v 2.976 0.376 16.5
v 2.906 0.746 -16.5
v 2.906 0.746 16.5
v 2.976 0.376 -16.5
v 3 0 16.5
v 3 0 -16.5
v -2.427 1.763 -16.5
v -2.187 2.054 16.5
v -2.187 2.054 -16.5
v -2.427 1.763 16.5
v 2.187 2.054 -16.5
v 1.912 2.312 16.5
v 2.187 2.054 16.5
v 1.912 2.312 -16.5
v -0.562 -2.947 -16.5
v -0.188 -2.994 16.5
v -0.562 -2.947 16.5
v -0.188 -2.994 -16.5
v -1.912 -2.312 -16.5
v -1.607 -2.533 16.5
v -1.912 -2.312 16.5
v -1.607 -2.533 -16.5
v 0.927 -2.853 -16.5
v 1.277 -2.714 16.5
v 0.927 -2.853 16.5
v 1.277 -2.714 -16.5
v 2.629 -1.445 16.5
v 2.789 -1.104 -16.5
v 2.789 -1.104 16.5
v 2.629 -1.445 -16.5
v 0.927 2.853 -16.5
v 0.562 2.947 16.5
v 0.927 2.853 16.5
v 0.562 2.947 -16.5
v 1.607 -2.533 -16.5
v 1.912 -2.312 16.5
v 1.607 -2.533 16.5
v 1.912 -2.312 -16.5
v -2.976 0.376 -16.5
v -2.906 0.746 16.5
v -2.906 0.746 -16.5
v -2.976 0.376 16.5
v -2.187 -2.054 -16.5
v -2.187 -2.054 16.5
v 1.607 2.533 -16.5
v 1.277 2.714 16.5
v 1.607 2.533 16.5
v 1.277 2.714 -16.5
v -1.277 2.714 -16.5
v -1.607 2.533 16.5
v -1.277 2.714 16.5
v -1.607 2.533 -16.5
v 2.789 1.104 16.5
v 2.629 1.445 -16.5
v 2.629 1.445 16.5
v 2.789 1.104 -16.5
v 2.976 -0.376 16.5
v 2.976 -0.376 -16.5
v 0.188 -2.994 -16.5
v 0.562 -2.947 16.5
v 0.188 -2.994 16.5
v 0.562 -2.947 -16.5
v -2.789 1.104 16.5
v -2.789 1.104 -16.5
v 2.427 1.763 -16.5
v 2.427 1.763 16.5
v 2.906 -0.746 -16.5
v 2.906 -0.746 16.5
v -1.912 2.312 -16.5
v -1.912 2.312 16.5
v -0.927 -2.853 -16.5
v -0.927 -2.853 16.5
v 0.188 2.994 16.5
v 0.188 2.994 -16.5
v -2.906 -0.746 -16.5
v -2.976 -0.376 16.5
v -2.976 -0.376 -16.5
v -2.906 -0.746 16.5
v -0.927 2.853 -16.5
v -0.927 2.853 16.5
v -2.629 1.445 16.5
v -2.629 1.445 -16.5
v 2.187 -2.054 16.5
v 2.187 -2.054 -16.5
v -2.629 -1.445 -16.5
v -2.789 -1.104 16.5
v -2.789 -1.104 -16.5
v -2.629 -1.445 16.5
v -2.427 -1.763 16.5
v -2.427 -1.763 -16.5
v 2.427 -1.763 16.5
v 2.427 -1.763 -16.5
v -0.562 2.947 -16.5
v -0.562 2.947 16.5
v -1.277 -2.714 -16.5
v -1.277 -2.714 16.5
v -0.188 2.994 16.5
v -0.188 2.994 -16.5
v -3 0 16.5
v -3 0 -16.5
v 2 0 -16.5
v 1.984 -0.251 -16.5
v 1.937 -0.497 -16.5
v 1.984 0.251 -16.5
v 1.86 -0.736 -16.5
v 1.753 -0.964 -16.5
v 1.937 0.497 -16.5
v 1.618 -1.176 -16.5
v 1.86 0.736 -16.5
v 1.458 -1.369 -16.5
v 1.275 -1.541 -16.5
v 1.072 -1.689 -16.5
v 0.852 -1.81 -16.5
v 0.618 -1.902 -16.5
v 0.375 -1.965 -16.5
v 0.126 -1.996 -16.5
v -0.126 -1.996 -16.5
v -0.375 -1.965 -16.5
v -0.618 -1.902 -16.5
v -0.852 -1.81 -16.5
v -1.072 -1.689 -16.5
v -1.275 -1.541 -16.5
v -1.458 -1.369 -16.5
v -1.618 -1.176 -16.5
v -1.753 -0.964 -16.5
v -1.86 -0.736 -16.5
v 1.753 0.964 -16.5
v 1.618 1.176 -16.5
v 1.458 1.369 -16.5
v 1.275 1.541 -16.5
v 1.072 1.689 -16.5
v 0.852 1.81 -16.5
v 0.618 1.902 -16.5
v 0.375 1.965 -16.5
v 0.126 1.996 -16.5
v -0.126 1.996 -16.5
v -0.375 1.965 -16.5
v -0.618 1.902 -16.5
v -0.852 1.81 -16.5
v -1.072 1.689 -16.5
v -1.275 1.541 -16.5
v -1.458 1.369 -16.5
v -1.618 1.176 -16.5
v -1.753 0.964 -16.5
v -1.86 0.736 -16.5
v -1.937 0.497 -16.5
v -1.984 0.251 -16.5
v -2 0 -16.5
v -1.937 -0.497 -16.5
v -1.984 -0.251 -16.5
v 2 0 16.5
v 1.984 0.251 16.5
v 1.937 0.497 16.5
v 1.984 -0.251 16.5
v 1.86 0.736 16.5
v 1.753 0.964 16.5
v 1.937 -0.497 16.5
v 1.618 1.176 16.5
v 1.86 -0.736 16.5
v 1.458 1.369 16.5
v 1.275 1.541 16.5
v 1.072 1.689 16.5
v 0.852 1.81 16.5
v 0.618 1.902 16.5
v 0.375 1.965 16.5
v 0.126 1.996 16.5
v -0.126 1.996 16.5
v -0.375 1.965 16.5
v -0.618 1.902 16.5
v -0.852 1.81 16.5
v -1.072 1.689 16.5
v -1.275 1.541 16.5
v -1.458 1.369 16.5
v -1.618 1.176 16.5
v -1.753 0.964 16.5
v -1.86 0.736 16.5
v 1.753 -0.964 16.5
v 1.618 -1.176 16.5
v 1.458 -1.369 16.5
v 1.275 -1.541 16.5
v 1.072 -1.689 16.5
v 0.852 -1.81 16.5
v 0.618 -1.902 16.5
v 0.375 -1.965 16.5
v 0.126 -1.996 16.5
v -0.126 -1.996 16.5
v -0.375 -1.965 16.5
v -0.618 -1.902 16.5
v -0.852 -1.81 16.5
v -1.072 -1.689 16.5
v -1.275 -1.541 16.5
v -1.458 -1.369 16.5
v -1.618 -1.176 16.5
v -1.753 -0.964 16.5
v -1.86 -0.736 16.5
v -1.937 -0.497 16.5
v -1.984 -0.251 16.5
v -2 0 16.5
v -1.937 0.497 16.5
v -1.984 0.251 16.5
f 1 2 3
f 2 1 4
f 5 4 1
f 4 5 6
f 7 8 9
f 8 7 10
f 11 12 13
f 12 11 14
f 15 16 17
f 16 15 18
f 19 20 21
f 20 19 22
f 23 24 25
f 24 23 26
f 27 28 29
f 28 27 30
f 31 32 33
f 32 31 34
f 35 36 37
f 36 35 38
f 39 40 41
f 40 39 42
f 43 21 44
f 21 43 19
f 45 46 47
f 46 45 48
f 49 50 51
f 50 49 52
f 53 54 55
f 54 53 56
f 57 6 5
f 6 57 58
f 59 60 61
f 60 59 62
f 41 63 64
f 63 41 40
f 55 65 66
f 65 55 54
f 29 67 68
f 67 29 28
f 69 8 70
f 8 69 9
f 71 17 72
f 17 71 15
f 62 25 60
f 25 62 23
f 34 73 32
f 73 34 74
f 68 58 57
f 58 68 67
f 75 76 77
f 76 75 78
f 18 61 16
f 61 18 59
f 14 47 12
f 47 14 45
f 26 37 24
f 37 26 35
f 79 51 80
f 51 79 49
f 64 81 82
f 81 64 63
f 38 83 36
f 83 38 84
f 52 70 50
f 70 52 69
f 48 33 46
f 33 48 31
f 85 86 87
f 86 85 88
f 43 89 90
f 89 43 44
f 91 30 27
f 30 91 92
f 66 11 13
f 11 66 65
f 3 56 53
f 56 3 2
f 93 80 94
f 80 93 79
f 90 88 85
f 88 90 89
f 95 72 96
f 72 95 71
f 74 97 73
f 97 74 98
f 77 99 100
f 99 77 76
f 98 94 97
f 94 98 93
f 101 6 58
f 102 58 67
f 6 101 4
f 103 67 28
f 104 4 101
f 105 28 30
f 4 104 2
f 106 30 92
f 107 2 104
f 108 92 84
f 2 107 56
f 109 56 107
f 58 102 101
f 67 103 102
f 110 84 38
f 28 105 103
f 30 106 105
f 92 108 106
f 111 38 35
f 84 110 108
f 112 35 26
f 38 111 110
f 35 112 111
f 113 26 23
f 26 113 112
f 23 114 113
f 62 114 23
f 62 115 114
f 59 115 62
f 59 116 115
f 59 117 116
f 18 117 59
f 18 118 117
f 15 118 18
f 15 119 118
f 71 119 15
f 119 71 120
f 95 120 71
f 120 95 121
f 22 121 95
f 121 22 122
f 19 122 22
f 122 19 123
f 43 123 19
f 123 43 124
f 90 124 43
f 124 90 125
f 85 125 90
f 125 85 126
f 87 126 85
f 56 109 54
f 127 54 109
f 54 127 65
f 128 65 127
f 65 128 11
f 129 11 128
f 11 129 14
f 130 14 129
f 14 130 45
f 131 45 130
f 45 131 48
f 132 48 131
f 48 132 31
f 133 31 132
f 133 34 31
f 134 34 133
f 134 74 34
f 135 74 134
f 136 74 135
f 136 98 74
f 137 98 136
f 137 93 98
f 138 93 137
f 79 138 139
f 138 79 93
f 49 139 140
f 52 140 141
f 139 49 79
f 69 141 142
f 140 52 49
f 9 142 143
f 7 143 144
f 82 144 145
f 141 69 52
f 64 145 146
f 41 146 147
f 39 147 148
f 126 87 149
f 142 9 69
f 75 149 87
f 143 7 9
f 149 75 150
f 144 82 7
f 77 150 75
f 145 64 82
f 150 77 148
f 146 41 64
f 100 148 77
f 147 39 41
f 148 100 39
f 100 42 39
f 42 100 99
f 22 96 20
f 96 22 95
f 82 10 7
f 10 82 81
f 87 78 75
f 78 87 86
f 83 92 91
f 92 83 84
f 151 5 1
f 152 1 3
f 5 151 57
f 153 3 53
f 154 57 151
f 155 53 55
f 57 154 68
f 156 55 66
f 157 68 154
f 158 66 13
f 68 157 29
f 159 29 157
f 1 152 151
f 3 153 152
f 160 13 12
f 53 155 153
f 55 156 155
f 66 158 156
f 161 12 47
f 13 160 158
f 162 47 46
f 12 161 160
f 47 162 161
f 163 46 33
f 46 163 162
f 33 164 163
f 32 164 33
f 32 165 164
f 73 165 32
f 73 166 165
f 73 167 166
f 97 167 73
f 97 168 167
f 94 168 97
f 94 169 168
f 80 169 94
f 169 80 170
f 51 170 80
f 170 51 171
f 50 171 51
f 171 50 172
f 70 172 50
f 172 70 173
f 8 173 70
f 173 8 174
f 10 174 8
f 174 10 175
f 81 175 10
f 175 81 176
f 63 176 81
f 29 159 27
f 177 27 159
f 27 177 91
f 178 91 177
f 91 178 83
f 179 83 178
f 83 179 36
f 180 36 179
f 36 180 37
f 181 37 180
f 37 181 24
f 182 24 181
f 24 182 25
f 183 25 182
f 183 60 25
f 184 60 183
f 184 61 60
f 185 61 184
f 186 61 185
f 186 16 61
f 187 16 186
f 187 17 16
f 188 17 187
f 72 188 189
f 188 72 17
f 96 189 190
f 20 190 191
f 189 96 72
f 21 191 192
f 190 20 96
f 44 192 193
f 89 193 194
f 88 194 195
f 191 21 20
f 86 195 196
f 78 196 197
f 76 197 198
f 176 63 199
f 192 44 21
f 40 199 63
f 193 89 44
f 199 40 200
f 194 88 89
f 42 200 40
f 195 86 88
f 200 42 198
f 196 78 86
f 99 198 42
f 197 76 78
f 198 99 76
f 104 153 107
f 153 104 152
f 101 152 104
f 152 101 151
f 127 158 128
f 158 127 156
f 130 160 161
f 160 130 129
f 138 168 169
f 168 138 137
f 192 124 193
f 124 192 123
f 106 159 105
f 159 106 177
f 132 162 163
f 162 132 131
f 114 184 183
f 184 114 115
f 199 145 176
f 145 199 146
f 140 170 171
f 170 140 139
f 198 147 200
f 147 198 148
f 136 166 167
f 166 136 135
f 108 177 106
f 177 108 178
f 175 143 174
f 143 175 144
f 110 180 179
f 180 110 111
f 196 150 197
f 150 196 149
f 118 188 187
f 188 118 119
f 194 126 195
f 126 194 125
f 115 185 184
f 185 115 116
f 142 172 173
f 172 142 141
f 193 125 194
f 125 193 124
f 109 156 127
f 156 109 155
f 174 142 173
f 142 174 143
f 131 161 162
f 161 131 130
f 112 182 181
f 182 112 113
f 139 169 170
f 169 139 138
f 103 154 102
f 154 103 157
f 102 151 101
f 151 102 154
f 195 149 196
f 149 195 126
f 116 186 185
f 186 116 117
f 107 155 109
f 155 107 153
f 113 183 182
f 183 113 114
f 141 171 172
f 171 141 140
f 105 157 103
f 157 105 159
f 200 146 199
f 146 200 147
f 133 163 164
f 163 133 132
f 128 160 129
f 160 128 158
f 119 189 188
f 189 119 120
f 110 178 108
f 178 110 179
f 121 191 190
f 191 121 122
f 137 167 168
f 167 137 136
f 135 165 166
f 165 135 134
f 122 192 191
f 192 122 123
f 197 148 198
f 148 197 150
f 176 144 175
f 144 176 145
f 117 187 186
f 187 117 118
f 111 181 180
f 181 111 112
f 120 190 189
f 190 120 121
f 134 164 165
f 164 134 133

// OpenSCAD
$fn = 50;


difference() {
	union() {
		translate(v = [0, 0, -16.5000000000]) {
			cylinder(h = 33, r = 3.0000000000);
		}
	}
	union() {
		translate(v = [0, 0, -100.0000000000]) {
			cylinder(h = 200, r = 2.0000000000);
		}
	}
}
